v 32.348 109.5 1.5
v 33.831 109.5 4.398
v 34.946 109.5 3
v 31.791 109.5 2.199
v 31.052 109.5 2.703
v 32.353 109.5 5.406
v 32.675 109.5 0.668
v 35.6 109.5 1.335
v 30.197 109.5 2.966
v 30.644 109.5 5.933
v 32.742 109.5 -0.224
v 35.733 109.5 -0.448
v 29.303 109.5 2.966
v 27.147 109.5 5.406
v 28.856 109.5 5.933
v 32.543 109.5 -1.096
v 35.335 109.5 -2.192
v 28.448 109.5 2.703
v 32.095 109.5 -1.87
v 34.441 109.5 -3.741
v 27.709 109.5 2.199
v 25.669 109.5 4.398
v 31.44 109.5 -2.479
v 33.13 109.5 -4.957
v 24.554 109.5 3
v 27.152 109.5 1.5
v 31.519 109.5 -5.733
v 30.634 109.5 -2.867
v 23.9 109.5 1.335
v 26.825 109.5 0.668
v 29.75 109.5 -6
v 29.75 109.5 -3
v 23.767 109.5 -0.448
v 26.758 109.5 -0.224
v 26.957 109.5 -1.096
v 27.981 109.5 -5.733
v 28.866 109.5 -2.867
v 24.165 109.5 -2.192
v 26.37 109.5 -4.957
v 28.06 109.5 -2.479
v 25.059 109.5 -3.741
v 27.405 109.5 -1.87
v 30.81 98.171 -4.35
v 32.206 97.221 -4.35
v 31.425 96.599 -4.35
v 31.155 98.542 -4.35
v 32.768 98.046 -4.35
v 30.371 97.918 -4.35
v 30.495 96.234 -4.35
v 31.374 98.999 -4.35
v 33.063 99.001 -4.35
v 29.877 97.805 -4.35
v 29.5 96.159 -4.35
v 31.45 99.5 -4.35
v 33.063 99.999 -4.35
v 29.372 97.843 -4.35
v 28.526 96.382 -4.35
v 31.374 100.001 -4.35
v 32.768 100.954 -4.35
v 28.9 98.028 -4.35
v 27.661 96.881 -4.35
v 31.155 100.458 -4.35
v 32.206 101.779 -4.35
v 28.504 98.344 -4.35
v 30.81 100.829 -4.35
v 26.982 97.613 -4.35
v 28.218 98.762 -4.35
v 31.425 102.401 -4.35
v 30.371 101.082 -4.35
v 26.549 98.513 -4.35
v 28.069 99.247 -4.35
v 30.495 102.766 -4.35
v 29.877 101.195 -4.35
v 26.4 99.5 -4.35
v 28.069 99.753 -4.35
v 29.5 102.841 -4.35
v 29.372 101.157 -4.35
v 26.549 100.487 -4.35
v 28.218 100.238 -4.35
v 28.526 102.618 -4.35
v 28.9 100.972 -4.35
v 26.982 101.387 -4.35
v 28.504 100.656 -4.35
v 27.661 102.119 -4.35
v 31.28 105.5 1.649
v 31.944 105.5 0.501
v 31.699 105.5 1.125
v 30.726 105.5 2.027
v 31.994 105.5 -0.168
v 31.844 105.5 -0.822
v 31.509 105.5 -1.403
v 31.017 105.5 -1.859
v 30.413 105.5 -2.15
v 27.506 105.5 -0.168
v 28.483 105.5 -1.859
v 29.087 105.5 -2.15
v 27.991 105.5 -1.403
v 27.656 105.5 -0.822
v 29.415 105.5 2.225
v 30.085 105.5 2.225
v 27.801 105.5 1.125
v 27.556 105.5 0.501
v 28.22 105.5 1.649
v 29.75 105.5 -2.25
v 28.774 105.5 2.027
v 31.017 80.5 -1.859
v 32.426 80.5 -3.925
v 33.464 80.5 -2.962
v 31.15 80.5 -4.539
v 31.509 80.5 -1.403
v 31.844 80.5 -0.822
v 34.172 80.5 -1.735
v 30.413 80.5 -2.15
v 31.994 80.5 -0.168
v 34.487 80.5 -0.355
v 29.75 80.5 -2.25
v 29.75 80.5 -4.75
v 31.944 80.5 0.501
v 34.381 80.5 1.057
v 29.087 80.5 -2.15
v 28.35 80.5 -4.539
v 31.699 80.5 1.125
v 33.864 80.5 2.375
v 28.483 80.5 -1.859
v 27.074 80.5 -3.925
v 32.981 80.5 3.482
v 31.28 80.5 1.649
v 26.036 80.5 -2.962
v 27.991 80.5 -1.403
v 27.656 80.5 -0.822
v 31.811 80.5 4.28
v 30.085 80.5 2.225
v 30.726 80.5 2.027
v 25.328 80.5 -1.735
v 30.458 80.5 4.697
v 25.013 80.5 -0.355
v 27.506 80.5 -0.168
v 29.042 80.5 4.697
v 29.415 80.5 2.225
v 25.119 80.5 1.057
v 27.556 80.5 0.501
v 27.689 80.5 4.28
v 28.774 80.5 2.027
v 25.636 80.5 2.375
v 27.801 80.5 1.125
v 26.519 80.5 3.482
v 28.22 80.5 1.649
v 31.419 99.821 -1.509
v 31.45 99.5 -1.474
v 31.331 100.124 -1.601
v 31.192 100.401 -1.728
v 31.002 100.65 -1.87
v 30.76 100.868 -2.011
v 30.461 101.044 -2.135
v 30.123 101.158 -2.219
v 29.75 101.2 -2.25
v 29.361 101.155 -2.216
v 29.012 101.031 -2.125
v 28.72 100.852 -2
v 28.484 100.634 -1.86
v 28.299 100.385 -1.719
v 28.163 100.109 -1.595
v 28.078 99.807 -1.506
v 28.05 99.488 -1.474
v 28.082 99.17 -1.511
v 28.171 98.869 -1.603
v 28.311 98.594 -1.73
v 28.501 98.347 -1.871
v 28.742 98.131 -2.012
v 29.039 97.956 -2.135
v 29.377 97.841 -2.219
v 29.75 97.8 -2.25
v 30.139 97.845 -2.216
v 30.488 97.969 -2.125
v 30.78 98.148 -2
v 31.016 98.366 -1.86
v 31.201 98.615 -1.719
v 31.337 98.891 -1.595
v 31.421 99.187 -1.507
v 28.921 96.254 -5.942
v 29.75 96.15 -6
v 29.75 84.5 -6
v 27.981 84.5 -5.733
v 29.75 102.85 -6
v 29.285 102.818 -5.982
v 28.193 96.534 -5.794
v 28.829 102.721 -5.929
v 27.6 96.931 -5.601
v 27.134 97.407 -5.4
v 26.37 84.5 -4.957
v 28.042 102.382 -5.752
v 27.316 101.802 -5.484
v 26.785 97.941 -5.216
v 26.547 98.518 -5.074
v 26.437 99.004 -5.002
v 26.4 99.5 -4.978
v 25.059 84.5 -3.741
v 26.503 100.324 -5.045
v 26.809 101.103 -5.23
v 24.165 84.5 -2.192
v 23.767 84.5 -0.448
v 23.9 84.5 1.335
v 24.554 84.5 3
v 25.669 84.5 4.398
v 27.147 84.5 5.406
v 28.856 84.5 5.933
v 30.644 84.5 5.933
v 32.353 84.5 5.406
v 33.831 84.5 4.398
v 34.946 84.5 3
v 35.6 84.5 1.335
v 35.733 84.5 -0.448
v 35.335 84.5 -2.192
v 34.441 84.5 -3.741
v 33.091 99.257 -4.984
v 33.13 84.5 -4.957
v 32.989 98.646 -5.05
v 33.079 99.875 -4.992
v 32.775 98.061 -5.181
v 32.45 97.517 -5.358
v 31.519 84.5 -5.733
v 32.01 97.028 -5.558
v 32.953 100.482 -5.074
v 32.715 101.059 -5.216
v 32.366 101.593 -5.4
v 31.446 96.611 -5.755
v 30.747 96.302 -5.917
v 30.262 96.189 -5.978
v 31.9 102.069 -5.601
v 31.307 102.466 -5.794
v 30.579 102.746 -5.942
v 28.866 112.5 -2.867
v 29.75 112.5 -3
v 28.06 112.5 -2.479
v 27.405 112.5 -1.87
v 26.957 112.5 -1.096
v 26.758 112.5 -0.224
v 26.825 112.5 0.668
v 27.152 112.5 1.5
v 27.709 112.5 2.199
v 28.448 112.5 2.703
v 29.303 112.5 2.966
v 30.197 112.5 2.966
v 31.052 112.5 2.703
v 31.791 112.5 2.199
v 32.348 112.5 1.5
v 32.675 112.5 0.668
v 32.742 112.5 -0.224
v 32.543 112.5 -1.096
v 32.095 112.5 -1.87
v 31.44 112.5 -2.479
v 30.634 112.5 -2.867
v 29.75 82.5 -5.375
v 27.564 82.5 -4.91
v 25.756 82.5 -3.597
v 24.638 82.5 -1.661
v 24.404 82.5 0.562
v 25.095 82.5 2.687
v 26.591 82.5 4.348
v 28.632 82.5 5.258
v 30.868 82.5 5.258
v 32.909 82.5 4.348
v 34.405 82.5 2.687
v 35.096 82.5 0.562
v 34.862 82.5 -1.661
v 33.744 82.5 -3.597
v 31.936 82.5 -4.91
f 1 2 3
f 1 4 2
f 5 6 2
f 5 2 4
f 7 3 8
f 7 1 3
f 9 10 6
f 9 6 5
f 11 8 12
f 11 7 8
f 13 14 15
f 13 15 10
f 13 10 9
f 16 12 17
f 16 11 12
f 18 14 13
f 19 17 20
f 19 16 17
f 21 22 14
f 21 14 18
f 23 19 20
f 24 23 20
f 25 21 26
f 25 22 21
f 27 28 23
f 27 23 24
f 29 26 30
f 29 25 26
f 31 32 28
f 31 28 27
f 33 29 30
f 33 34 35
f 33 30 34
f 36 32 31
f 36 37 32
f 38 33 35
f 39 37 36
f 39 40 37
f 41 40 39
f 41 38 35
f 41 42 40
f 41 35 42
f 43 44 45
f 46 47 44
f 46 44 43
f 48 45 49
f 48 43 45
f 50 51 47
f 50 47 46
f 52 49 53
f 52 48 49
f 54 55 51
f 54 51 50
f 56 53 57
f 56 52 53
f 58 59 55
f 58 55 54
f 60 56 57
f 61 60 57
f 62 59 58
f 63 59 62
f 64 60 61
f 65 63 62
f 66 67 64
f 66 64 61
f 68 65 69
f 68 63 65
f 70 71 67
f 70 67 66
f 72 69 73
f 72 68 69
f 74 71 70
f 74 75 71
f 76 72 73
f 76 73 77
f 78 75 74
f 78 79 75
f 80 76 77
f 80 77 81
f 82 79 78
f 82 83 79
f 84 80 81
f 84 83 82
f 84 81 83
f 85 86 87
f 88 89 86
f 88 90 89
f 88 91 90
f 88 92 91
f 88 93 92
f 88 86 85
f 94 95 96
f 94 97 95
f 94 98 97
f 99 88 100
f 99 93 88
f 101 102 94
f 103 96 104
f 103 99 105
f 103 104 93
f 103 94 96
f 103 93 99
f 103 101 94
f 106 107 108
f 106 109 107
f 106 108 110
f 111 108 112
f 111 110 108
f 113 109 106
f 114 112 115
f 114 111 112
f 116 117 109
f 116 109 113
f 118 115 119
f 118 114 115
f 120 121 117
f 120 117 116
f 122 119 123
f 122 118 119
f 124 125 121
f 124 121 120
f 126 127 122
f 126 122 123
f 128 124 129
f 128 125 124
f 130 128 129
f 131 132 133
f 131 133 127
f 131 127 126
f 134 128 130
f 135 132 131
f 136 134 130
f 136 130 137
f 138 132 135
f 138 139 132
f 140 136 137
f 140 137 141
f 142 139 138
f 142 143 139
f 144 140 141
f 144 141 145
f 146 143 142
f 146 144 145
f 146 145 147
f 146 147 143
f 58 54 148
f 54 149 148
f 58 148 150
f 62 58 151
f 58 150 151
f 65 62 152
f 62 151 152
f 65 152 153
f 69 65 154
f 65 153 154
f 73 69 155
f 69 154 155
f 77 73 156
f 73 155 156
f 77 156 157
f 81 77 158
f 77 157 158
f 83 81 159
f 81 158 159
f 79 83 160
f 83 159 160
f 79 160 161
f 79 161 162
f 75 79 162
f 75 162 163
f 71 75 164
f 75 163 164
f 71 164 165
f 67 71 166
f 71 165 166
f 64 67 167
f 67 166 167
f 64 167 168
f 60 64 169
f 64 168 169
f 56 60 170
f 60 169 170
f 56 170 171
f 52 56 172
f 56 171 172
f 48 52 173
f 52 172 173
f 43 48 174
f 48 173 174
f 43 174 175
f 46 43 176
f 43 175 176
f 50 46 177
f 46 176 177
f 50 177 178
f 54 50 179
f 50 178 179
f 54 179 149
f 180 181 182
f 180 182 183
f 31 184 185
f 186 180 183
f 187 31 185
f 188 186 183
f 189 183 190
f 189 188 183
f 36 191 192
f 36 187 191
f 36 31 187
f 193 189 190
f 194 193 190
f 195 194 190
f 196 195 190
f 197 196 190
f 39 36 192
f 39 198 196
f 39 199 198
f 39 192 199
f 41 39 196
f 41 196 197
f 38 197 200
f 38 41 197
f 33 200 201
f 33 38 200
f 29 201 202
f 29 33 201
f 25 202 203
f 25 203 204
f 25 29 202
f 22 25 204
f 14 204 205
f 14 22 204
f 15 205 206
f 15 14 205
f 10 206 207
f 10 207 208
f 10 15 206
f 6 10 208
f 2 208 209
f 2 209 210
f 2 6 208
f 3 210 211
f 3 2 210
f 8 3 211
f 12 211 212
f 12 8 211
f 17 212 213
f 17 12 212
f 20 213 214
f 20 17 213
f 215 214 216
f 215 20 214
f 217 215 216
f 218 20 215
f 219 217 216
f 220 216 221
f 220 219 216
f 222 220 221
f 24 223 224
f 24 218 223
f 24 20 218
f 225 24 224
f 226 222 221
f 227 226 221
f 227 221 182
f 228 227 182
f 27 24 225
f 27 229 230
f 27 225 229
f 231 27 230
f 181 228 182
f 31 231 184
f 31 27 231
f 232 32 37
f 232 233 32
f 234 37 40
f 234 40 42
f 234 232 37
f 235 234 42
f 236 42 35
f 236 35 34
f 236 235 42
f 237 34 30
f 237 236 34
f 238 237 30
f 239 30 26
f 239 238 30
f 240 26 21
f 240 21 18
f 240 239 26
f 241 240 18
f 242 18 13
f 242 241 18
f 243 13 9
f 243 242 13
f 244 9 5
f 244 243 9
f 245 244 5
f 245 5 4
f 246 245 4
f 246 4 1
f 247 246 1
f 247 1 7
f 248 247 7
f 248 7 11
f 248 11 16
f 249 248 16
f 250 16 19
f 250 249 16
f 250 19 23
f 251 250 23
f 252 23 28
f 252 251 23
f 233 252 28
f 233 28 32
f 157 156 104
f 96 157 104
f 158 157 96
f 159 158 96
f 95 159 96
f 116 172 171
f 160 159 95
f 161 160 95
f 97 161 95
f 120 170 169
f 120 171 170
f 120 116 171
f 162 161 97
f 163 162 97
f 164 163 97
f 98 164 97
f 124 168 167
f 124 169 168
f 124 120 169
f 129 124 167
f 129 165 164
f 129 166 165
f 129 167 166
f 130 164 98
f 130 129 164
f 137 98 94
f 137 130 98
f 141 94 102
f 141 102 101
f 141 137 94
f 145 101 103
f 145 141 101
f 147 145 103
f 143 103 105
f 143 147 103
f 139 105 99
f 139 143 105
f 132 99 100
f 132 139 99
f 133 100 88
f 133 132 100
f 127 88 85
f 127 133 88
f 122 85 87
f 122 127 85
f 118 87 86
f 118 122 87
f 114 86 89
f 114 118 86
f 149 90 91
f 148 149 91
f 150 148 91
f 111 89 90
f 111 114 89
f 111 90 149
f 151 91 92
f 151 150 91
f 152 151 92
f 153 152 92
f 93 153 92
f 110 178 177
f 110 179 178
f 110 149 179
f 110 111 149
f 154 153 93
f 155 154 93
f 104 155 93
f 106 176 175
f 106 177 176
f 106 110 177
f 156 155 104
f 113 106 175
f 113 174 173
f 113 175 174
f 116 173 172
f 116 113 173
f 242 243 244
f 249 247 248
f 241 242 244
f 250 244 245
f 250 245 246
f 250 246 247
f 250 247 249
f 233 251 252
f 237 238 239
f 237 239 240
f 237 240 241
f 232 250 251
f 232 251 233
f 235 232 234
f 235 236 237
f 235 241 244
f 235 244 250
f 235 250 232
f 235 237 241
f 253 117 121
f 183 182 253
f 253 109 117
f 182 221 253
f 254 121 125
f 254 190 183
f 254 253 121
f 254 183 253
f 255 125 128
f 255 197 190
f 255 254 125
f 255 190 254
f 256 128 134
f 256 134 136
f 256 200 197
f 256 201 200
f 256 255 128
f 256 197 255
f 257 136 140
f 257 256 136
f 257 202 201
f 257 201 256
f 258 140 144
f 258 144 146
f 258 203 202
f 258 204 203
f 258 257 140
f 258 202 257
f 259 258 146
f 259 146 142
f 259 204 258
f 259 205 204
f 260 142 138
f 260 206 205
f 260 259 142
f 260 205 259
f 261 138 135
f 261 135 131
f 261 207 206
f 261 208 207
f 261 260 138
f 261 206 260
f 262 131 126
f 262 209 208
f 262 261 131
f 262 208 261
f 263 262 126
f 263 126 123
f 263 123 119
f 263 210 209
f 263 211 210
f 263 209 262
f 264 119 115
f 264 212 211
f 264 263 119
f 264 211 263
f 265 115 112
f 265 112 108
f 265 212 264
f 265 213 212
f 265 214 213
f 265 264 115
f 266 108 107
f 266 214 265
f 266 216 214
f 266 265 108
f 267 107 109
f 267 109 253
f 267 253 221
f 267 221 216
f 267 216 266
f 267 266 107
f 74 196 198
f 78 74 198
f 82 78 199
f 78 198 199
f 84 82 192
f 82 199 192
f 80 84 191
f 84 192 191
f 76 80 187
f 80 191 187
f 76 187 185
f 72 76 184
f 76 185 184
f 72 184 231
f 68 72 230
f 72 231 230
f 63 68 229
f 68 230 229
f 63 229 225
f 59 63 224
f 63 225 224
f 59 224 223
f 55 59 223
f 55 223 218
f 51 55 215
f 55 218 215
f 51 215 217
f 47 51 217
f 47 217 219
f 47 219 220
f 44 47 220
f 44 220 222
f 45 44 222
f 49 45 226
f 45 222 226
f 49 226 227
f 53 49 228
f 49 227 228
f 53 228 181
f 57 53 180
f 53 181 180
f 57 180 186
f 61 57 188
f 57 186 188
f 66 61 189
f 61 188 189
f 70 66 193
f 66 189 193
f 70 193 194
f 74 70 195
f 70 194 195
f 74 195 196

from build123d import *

# Parameters (mm, degrees)
REBAIXO_PARA_SBHCS_M36_D           = 3.4
REBAIXO_PARA_SBHCS_M36_DEPTH       = 5
REBAIXO_PARA_SBHCS_M36_CBORE_D     = 6.7
REBAIXO_PARA_SBHCS_M36_CBORE_DEPTH = 1.65
REBAIXO_PARA_SBHCS_M36_TIP         = 1.021463052


with BuildPart() as part:
    # Esboço1 → Revolução1 (revolve)
    with BuildSketch(Plane.XY, mode=Mode.PRIVATE) as revolu_o1_sk:
        Polygon((29.75, 112.5), (29.75, 105.5), (32, 105.5), (32, 80.5), (34.5, 80.5), (35.75, 84.5), (35.75, 109.5), (32.75, 109.5), (32.75, 112.5), align=None)
    revolve(revolu_o1_sk.sketch.rotate(Axis((29.75, 33.489540419, 0), (0, 1, 0)), 90), axis=Axis((29.75, 33.489540419, 0), (0, 1, 0)))

    # Rebaixo para SBHCS M36
    with Locations(Plane(origin=(0, 0, -6), x_dir=(-1, 0, 0), z_dir=(0, 0, -1))):
        with Locations((-29.75, 99.5)):
            CounterBoreHole(REBAIXO_PARA_SBHCS_M36_D / 2, REBAIXO_PARA_SBHCS_M36_CBORE_D / 2, REBAIXO_PARA_SBHCS_M36_CBORE_DEPTH, depth=REBAIXO_PARA_SBHCS_M36_DEPTH)
            with Locations((0, 0, -(REBAIXO_PARA_SBHCS_M36_DEPTH + REBAIXO_PARA_SBHCS_M36_TIP / 2))):  # 118° drill point
                Cone(0, REBAIXO_PARA_SBHCS_M36_D / 2, REBAIXO_PARA_SBHCS_M36_TIP, mode=Mode.SUBTRACT)


solid = part.part
